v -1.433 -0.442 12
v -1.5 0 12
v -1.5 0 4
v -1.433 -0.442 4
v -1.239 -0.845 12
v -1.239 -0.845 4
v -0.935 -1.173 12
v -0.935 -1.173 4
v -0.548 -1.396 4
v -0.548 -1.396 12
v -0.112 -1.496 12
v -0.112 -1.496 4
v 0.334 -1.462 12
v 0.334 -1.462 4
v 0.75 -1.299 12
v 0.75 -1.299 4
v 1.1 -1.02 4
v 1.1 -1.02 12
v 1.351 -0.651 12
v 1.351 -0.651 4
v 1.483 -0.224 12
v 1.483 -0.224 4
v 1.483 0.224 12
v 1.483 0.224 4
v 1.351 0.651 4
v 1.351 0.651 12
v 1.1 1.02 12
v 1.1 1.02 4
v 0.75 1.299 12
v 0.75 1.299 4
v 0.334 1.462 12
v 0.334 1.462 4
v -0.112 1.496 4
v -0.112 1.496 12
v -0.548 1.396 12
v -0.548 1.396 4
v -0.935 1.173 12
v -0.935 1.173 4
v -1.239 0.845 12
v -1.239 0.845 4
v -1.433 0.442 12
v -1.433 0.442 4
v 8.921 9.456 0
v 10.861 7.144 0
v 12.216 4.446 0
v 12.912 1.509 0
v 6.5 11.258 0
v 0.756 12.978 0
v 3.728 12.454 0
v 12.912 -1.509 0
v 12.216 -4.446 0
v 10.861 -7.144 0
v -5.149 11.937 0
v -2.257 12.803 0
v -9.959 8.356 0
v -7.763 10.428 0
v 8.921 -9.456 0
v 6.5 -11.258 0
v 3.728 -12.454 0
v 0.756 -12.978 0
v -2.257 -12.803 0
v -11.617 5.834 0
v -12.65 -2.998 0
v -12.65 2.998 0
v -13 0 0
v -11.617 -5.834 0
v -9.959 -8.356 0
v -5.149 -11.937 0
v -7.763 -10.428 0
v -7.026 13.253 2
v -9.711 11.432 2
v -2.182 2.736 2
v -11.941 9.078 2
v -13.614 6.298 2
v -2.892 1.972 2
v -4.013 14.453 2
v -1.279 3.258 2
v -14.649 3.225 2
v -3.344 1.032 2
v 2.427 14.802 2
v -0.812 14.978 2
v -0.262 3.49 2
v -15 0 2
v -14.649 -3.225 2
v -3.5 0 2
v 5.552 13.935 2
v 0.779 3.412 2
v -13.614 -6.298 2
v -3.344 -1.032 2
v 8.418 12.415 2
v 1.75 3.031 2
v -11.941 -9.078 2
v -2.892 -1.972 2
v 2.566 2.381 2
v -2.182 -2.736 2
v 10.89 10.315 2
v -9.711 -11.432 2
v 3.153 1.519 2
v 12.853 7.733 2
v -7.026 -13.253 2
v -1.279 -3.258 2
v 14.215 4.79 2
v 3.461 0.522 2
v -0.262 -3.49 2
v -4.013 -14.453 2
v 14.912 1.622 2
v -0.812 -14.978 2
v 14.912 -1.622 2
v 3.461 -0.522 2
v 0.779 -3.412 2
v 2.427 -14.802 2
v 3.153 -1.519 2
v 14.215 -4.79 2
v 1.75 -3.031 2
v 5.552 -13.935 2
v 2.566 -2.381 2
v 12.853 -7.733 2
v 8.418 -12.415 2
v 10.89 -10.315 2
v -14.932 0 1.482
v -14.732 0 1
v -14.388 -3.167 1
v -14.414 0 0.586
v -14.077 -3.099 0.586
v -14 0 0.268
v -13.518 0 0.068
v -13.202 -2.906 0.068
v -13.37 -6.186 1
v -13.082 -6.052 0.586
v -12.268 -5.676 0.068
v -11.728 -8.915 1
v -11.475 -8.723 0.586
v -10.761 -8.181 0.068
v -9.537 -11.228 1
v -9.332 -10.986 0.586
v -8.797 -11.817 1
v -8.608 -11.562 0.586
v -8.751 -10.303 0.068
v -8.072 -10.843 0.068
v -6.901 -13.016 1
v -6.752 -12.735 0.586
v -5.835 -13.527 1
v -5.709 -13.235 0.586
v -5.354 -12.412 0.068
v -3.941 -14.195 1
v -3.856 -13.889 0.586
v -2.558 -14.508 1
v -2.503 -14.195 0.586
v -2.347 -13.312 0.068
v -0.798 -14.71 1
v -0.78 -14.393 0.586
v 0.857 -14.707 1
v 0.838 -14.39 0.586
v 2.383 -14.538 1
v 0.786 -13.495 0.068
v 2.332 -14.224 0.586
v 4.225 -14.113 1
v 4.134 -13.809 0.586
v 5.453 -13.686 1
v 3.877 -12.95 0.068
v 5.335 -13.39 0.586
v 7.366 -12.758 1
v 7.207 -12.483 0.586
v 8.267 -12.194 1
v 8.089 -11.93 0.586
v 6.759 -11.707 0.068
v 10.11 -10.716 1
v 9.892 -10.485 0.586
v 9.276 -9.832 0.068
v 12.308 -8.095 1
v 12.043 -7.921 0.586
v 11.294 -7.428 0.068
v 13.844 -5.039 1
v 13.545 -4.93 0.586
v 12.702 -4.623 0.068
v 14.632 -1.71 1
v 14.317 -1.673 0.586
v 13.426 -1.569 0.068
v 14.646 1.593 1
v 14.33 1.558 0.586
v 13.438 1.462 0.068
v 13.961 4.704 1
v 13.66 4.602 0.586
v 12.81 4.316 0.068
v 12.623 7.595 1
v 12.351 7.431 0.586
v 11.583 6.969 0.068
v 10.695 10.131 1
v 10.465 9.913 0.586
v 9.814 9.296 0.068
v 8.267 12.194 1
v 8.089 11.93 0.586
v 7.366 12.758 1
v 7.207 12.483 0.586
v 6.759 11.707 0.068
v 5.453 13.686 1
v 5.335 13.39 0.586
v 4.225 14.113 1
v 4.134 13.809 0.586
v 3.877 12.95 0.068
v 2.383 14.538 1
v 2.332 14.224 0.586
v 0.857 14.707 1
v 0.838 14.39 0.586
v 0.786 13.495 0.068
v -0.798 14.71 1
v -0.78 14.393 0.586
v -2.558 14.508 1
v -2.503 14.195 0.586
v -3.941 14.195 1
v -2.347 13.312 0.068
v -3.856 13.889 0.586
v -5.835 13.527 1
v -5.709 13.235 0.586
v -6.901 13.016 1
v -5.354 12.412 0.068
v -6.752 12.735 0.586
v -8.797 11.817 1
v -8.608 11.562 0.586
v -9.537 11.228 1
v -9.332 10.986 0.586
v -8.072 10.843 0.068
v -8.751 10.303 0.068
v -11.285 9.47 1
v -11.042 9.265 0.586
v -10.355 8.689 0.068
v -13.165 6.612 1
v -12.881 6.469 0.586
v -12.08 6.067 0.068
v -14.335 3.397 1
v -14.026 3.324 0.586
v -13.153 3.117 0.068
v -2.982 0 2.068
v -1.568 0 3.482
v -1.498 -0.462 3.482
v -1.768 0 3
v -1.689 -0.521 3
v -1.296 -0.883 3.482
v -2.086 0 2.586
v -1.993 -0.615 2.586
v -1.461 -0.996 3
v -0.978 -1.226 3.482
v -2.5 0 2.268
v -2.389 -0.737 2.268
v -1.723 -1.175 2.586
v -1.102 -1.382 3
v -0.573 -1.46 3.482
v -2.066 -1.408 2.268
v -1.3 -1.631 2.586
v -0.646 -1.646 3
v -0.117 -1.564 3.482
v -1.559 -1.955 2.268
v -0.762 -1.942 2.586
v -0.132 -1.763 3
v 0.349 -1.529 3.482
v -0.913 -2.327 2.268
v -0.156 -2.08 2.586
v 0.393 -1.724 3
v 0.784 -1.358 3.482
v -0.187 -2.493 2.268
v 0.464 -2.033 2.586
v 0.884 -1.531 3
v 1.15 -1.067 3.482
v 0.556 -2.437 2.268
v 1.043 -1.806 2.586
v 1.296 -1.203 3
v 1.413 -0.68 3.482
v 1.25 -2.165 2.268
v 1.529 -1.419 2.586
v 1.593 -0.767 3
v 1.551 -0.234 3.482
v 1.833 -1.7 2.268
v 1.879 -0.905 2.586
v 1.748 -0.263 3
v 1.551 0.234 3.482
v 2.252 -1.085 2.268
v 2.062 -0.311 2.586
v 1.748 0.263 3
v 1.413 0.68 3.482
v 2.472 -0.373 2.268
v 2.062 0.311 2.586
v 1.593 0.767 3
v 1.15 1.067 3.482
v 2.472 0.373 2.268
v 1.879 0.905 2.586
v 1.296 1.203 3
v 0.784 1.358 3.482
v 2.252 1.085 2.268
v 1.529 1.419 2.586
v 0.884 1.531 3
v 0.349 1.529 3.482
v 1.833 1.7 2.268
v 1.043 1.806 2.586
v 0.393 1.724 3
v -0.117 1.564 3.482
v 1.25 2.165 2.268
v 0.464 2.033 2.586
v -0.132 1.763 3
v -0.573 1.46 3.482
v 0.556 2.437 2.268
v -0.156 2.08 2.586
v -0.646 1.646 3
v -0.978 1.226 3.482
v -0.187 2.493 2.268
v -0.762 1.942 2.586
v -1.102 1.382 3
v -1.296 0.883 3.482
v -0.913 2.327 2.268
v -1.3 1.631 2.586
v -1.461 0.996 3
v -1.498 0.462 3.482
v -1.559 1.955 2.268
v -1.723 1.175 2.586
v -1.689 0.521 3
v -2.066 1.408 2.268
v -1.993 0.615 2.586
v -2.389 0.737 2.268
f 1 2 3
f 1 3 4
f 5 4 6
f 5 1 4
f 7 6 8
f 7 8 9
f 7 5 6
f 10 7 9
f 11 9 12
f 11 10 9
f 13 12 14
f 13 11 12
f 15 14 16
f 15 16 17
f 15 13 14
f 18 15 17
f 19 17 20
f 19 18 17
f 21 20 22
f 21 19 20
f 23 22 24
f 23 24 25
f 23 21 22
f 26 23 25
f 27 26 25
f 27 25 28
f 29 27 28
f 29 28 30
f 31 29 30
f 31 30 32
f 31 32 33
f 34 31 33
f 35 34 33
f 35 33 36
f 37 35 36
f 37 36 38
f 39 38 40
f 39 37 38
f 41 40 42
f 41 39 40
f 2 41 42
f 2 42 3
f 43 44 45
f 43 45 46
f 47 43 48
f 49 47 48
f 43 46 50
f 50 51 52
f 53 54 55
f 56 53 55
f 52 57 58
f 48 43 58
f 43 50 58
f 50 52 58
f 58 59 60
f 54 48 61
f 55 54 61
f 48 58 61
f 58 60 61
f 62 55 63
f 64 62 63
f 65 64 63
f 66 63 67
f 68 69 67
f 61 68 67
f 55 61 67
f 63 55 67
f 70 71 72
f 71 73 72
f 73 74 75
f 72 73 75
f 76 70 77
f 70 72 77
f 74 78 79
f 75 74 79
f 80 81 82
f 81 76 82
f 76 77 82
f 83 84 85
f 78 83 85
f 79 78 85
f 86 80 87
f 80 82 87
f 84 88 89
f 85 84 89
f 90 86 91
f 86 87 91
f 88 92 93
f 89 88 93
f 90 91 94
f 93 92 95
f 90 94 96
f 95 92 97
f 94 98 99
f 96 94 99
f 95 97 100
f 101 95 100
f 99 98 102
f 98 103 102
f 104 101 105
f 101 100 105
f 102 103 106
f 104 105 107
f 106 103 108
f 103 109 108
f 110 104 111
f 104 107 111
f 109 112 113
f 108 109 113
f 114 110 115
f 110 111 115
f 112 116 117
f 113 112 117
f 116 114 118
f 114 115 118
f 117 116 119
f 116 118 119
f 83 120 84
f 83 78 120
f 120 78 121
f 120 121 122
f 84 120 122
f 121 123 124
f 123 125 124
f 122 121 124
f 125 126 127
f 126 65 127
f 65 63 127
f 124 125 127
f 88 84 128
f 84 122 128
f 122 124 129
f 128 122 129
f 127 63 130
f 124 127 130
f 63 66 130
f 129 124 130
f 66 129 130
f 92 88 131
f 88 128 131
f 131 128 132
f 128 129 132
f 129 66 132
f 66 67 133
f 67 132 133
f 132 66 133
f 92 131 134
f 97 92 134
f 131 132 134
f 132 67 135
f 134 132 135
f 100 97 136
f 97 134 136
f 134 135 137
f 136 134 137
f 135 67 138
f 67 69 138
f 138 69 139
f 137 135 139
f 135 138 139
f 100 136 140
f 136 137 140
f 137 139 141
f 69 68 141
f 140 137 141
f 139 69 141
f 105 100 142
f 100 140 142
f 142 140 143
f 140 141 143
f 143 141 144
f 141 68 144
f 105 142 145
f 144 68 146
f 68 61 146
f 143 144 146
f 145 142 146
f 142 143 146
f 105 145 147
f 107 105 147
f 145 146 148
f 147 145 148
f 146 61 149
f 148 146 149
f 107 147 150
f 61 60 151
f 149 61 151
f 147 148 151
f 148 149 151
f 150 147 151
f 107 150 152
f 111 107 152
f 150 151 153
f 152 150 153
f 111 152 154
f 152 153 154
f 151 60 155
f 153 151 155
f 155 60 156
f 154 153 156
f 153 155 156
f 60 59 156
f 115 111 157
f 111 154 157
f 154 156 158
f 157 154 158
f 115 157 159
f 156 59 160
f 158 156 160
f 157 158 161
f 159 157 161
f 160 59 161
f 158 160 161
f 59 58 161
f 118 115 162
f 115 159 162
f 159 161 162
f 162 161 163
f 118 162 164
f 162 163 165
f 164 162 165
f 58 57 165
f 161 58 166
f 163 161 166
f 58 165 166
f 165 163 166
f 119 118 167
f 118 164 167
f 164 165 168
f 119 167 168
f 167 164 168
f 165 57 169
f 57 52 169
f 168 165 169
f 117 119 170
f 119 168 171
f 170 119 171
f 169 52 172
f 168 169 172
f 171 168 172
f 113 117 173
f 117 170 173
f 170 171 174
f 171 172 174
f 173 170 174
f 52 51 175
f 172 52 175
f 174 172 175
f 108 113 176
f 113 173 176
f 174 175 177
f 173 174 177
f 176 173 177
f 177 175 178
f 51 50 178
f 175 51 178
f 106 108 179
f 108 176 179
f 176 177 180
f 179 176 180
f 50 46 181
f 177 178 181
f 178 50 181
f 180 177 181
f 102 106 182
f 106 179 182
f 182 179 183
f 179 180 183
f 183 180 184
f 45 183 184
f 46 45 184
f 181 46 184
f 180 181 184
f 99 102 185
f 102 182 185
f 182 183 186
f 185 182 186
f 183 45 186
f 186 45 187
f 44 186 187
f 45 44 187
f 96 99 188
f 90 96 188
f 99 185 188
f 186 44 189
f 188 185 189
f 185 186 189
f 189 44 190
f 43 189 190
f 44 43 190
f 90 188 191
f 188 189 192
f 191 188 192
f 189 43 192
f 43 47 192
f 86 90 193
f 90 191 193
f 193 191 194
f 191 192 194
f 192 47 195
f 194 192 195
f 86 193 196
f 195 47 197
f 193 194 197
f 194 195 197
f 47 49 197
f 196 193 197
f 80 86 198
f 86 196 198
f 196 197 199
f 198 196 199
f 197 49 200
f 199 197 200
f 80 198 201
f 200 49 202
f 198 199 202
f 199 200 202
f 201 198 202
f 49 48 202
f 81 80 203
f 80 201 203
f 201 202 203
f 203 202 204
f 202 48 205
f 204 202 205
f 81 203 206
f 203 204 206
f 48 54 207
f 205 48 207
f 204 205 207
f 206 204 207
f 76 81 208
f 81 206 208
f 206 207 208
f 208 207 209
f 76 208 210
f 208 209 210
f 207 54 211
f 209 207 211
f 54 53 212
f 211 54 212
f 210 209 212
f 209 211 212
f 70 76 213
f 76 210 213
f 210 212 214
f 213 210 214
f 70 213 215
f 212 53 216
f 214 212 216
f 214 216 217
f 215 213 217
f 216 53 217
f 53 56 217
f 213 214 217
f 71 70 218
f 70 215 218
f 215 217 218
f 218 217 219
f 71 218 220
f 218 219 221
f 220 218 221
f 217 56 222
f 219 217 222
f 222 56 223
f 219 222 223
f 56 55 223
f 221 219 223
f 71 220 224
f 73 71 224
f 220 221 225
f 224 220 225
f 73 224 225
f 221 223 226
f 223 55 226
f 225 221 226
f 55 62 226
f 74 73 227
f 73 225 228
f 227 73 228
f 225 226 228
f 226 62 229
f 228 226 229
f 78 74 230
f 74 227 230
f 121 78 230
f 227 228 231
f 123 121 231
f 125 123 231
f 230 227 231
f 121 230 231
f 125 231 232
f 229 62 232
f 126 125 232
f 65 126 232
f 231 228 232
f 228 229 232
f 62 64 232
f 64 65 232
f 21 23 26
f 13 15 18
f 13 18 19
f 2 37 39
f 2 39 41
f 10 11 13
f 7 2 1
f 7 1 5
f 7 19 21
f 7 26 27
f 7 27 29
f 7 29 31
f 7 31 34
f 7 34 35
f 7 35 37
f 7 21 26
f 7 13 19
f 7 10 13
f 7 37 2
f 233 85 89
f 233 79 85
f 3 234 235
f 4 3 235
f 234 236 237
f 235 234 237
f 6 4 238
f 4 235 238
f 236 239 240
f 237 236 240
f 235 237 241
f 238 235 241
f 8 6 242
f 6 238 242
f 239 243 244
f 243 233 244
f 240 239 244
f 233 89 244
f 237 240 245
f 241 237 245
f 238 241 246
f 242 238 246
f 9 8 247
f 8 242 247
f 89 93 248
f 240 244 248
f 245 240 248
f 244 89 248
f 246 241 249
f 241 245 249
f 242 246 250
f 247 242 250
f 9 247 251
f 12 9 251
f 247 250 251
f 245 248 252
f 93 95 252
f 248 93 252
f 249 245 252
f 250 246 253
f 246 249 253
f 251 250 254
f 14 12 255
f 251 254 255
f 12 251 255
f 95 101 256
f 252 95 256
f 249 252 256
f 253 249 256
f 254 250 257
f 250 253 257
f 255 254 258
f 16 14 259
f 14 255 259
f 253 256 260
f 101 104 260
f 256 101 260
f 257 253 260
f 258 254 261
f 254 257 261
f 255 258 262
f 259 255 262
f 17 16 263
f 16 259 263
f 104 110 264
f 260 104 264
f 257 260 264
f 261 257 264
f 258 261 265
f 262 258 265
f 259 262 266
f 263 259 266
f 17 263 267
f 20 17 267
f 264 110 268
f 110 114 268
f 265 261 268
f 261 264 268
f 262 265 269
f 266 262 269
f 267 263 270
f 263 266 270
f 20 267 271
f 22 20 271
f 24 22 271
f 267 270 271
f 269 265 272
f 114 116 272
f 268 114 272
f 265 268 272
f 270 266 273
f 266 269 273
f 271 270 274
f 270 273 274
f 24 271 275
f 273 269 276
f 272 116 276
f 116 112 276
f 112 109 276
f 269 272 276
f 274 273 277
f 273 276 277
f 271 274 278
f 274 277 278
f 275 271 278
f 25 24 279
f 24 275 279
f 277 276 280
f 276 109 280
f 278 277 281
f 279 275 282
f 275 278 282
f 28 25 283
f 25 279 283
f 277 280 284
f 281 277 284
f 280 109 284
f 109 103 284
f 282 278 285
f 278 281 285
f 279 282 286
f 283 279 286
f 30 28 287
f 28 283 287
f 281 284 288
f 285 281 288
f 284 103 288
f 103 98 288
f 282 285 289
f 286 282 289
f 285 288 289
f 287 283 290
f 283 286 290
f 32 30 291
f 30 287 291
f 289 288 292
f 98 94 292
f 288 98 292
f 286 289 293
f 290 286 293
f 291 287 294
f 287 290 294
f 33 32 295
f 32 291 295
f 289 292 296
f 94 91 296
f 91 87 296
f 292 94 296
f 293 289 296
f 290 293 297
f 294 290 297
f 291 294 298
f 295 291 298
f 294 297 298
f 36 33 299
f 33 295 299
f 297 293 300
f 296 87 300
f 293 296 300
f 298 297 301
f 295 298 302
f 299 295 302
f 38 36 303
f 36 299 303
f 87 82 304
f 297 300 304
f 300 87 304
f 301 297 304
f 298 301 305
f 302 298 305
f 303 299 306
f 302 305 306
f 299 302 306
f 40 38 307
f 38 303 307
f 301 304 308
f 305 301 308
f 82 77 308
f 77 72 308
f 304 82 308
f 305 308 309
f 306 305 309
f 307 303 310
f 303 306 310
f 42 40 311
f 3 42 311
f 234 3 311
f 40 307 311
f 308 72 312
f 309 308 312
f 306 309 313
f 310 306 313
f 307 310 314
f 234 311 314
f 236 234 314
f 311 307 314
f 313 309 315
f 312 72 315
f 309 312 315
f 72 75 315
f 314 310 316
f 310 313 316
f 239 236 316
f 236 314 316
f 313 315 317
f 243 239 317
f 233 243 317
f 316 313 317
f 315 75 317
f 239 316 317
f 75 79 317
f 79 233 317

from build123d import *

# Parameters (mm, degrees)
F0_W = 1.5
F0_H = 10
F2_R = 1.99999


# Not quite as in the source:
# - a fillet or chamfer is up to 0.001 mm smaller than in the source, because OpenCascade refuses the exact size


with BuildPart() as f1:
    # F0 (on Front) → F1 (revolve)
    with BuildSketch(Plane.XZ):
        with Locations((-0.75, 7)):
            Rectangle(F0_W, F0_H)
        Polygon((-15, 0), (0, 0), (0, 2), (-1.5, 2), (-15, 2), align=None)
    revolve(axis=Axis((0, 0, 27.7387052774), (0, 0, 1)))

    # F2 (radius 2 in the source; OpenCascade refuses exactly that, so slightly less here)
    f2_edges = [f1.edges().sort_by_distance(p)[0] for p in [
        (15, 0, 0),
        (1.5, 0, 2),
    ]]
    fillet(f2_edges, radius=F2_R)


solid = f1.part
